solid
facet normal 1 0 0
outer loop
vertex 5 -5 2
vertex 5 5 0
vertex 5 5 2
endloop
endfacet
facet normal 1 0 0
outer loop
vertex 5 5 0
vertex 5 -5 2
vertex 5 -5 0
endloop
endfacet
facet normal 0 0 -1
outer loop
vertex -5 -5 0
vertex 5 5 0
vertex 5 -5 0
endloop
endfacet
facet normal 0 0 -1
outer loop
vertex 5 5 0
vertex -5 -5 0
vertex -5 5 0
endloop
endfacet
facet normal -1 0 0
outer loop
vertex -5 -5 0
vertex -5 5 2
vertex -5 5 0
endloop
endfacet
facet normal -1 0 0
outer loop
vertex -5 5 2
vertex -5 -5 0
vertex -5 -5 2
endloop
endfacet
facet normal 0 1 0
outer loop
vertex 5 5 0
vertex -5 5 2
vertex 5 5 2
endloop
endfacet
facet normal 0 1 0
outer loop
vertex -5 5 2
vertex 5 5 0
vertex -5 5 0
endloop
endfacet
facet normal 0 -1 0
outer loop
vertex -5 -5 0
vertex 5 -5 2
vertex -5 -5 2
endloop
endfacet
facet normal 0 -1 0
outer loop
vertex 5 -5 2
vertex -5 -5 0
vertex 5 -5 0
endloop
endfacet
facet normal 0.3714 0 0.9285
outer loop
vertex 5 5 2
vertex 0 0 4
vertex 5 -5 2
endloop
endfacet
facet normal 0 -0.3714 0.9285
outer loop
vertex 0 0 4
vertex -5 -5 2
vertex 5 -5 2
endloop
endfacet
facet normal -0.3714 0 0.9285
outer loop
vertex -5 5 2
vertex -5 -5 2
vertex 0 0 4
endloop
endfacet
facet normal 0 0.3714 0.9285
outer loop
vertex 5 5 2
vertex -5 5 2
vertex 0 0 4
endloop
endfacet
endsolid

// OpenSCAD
//=============================================================================
// One of these is used for each face of the TranslationTool.
//=============================================================================

module Pyramid(baseSize = 10, height = 10) {
     bsh = baseSize / 2;
     points = [
          // Base.
          [ bsh,  bsh, 0],
          [ bsh, -bsh, 0],
          [-bsh, -bsh, 0],
          [-bsh,  bsh, 0],
          // Pointy top.
          [0, 0, height]
     ];
     faces = [
          // Sides.
          [0, 4, 1], [1, 4, 2], [2, 4, 3], [3, 4, 0],
          // Base
          [1, 3, 0], [2, 3, 1]
     ];

     polyhedron(points = points, faces = faces);
}

module TranslationFace() {
     translate([0, 0, 1]) cube([10, 10, 2], center = true);
     translate([0, 0, 2]) Pyramid(baseSize = 10, height = 2);
}

TranslationFace();
